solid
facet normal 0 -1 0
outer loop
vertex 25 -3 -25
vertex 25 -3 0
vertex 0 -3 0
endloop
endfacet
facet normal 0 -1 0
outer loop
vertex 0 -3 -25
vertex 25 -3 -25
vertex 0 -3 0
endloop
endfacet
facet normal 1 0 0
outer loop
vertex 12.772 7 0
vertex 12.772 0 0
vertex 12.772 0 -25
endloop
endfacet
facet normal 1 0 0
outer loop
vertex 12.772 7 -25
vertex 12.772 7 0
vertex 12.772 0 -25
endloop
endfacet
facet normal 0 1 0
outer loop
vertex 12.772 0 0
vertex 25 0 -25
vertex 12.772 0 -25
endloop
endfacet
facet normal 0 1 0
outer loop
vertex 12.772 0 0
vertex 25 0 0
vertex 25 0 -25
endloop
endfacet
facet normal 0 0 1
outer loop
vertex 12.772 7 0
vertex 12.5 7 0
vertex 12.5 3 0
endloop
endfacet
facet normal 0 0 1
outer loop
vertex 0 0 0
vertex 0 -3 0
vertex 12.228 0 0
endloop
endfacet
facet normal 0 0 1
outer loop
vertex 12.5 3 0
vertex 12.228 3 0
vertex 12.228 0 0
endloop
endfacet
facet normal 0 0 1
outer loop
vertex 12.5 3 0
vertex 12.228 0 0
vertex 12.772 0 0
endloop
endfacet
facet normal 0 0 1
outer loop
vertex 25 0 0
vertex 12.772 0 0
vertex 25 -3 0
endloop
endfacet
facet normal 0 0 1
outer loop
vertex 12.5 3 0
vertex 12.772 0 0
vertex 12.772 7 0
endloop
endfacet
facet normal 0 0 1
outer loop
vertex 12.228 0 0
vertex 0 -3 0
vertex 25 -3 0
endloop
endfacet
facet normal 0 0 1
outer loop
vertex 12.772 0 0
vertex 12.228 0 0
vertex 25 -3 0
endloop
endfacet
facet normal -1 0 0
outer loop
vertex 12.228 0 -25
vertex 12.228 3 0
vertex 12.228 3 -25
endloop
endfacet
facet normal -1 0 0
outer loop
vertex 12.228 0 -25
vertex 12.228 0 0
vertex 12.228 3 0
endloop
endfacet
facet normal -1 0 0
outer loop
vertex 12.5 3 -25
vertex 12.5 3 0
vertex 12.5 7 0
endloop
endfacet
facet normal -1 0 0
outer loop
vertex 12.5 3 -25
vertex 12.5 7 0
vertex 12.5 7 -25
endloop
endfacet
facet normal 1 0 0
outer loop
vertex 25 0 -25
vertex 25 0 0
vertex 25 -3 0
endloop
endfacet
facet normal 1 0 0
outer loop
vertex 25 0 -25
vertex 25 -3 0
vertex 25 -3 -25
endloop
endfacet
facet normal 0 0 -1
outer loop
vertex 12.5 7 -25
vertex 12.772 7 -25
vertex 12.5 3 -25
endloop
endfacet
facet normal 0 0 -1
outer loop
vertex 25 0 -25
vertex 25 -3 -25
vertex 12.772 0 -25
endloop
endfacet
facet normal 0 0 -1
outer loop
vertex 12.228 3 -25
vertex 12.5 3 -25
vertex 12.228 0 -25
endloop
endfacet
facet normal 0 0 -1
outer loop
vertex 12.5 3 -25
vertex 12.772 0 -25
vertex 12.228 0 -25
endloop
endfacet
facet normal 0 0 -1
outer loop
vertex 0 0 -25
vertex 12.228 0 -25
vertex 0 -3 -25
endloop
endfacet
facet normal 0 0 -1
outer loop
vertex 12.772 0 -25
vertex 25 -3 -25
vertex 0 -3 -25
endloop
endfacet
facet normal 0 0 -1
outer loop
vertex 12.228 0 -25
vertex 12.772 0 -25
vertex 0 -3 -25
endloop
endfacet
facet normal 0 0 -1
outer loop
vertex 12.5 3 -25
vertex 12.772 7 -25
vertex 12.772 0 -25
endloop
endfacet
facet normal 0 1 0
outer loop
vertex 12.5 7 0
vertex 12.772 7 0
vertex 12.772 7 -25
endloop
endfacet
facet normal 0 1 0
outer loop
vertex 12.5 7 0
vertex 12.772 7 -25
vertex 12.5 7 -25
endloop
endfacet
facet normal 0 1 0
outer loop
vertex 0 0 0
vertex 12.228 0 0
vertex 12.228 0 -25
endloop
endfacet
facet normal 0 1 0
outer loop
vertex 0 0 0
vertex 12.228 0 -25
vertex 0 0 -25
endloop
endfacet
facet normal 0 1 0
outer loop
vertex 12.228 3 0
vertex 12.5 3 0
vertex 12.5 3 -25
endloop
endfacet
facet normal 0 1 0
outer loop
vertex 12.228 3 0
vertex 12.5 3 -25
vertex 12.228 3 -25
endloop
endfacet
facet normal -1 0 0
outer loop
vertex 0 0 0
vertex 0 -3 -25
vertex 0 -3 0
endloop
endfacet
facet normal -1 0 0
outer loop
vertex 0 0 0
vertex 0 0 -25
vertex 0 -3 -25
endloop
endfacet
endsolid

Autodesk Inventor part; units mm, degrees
ref_plane "YZ Plane" through (0, 0, 0) normal (1, 0, 0) x (0, 1, 0)
ref_plane "XZ Plane" through (0, 0, 0) normal (0, 1, 0) x (-1, 0, 0)
ref_plane "XY Plane" through (0, 0, 0) normal (0, 0, 1) x (1, 0, 0)
sketch "Sketch1" plane through (0, 0, 0) normal (0, 1, 0) x (-1, 0, 0)
  line L0 (0, 0) -> (-25, 0)
  line L1 (-25, 0) -> (-25, -25)
  line L2 (-25, -25) -> (0, -25)
  line L3 (0, -25) -> (0, 0)
  line L4 (-12.5, 0) -> (-12.5, -25)
  line L5 (-12.5, 0) -> (-12.772, 0)
  line L6 (-12.772, 0) -> (-12.772, -25)
  line L7 (-25, -25) -> (0, -25)
  line L8 (0, -25) -> (0, -26.7912)
  line L9 (0, -26.7912) -> (-25, -26.7912)
  line L10 (-25, -26.7912) -> (-25, -25)
  line L11 (-12.5, -26.7912) -> (-12.5, -25)
  line L12 (-12.228, 0) -> (-12.228, -25)
  dimension "d0" = 25
  dimension "d1" = 25
  dimension "d2" = 0.272
extrude "Extrusion1" add sketch "Sketch1" against normal blind 3 contours L3 L2 L12 L0 | L12 L2 L4 L0 | L4 L2 L6 L0 | L6 L2 L1 L0
extrude "Extrusion2" add sketch "Sketch1" along normal blind 7 contours L4 L2 L6 L0
extrude "Extrusion3" add sketch "Sketch1" along normal blind 3 contours L12 L2 L4 L0
sketch "Sketch2" plane through (25, -3, -25) normal (0, 0, -1) x (-1, 0, 0)
  line L0 (12.5, 6) -> (12.5, 10) projected
  line L1 (12.5, 10) -> (12.5, 30.188)
  point P0 (25, 3)
properties part number "podłoga"
